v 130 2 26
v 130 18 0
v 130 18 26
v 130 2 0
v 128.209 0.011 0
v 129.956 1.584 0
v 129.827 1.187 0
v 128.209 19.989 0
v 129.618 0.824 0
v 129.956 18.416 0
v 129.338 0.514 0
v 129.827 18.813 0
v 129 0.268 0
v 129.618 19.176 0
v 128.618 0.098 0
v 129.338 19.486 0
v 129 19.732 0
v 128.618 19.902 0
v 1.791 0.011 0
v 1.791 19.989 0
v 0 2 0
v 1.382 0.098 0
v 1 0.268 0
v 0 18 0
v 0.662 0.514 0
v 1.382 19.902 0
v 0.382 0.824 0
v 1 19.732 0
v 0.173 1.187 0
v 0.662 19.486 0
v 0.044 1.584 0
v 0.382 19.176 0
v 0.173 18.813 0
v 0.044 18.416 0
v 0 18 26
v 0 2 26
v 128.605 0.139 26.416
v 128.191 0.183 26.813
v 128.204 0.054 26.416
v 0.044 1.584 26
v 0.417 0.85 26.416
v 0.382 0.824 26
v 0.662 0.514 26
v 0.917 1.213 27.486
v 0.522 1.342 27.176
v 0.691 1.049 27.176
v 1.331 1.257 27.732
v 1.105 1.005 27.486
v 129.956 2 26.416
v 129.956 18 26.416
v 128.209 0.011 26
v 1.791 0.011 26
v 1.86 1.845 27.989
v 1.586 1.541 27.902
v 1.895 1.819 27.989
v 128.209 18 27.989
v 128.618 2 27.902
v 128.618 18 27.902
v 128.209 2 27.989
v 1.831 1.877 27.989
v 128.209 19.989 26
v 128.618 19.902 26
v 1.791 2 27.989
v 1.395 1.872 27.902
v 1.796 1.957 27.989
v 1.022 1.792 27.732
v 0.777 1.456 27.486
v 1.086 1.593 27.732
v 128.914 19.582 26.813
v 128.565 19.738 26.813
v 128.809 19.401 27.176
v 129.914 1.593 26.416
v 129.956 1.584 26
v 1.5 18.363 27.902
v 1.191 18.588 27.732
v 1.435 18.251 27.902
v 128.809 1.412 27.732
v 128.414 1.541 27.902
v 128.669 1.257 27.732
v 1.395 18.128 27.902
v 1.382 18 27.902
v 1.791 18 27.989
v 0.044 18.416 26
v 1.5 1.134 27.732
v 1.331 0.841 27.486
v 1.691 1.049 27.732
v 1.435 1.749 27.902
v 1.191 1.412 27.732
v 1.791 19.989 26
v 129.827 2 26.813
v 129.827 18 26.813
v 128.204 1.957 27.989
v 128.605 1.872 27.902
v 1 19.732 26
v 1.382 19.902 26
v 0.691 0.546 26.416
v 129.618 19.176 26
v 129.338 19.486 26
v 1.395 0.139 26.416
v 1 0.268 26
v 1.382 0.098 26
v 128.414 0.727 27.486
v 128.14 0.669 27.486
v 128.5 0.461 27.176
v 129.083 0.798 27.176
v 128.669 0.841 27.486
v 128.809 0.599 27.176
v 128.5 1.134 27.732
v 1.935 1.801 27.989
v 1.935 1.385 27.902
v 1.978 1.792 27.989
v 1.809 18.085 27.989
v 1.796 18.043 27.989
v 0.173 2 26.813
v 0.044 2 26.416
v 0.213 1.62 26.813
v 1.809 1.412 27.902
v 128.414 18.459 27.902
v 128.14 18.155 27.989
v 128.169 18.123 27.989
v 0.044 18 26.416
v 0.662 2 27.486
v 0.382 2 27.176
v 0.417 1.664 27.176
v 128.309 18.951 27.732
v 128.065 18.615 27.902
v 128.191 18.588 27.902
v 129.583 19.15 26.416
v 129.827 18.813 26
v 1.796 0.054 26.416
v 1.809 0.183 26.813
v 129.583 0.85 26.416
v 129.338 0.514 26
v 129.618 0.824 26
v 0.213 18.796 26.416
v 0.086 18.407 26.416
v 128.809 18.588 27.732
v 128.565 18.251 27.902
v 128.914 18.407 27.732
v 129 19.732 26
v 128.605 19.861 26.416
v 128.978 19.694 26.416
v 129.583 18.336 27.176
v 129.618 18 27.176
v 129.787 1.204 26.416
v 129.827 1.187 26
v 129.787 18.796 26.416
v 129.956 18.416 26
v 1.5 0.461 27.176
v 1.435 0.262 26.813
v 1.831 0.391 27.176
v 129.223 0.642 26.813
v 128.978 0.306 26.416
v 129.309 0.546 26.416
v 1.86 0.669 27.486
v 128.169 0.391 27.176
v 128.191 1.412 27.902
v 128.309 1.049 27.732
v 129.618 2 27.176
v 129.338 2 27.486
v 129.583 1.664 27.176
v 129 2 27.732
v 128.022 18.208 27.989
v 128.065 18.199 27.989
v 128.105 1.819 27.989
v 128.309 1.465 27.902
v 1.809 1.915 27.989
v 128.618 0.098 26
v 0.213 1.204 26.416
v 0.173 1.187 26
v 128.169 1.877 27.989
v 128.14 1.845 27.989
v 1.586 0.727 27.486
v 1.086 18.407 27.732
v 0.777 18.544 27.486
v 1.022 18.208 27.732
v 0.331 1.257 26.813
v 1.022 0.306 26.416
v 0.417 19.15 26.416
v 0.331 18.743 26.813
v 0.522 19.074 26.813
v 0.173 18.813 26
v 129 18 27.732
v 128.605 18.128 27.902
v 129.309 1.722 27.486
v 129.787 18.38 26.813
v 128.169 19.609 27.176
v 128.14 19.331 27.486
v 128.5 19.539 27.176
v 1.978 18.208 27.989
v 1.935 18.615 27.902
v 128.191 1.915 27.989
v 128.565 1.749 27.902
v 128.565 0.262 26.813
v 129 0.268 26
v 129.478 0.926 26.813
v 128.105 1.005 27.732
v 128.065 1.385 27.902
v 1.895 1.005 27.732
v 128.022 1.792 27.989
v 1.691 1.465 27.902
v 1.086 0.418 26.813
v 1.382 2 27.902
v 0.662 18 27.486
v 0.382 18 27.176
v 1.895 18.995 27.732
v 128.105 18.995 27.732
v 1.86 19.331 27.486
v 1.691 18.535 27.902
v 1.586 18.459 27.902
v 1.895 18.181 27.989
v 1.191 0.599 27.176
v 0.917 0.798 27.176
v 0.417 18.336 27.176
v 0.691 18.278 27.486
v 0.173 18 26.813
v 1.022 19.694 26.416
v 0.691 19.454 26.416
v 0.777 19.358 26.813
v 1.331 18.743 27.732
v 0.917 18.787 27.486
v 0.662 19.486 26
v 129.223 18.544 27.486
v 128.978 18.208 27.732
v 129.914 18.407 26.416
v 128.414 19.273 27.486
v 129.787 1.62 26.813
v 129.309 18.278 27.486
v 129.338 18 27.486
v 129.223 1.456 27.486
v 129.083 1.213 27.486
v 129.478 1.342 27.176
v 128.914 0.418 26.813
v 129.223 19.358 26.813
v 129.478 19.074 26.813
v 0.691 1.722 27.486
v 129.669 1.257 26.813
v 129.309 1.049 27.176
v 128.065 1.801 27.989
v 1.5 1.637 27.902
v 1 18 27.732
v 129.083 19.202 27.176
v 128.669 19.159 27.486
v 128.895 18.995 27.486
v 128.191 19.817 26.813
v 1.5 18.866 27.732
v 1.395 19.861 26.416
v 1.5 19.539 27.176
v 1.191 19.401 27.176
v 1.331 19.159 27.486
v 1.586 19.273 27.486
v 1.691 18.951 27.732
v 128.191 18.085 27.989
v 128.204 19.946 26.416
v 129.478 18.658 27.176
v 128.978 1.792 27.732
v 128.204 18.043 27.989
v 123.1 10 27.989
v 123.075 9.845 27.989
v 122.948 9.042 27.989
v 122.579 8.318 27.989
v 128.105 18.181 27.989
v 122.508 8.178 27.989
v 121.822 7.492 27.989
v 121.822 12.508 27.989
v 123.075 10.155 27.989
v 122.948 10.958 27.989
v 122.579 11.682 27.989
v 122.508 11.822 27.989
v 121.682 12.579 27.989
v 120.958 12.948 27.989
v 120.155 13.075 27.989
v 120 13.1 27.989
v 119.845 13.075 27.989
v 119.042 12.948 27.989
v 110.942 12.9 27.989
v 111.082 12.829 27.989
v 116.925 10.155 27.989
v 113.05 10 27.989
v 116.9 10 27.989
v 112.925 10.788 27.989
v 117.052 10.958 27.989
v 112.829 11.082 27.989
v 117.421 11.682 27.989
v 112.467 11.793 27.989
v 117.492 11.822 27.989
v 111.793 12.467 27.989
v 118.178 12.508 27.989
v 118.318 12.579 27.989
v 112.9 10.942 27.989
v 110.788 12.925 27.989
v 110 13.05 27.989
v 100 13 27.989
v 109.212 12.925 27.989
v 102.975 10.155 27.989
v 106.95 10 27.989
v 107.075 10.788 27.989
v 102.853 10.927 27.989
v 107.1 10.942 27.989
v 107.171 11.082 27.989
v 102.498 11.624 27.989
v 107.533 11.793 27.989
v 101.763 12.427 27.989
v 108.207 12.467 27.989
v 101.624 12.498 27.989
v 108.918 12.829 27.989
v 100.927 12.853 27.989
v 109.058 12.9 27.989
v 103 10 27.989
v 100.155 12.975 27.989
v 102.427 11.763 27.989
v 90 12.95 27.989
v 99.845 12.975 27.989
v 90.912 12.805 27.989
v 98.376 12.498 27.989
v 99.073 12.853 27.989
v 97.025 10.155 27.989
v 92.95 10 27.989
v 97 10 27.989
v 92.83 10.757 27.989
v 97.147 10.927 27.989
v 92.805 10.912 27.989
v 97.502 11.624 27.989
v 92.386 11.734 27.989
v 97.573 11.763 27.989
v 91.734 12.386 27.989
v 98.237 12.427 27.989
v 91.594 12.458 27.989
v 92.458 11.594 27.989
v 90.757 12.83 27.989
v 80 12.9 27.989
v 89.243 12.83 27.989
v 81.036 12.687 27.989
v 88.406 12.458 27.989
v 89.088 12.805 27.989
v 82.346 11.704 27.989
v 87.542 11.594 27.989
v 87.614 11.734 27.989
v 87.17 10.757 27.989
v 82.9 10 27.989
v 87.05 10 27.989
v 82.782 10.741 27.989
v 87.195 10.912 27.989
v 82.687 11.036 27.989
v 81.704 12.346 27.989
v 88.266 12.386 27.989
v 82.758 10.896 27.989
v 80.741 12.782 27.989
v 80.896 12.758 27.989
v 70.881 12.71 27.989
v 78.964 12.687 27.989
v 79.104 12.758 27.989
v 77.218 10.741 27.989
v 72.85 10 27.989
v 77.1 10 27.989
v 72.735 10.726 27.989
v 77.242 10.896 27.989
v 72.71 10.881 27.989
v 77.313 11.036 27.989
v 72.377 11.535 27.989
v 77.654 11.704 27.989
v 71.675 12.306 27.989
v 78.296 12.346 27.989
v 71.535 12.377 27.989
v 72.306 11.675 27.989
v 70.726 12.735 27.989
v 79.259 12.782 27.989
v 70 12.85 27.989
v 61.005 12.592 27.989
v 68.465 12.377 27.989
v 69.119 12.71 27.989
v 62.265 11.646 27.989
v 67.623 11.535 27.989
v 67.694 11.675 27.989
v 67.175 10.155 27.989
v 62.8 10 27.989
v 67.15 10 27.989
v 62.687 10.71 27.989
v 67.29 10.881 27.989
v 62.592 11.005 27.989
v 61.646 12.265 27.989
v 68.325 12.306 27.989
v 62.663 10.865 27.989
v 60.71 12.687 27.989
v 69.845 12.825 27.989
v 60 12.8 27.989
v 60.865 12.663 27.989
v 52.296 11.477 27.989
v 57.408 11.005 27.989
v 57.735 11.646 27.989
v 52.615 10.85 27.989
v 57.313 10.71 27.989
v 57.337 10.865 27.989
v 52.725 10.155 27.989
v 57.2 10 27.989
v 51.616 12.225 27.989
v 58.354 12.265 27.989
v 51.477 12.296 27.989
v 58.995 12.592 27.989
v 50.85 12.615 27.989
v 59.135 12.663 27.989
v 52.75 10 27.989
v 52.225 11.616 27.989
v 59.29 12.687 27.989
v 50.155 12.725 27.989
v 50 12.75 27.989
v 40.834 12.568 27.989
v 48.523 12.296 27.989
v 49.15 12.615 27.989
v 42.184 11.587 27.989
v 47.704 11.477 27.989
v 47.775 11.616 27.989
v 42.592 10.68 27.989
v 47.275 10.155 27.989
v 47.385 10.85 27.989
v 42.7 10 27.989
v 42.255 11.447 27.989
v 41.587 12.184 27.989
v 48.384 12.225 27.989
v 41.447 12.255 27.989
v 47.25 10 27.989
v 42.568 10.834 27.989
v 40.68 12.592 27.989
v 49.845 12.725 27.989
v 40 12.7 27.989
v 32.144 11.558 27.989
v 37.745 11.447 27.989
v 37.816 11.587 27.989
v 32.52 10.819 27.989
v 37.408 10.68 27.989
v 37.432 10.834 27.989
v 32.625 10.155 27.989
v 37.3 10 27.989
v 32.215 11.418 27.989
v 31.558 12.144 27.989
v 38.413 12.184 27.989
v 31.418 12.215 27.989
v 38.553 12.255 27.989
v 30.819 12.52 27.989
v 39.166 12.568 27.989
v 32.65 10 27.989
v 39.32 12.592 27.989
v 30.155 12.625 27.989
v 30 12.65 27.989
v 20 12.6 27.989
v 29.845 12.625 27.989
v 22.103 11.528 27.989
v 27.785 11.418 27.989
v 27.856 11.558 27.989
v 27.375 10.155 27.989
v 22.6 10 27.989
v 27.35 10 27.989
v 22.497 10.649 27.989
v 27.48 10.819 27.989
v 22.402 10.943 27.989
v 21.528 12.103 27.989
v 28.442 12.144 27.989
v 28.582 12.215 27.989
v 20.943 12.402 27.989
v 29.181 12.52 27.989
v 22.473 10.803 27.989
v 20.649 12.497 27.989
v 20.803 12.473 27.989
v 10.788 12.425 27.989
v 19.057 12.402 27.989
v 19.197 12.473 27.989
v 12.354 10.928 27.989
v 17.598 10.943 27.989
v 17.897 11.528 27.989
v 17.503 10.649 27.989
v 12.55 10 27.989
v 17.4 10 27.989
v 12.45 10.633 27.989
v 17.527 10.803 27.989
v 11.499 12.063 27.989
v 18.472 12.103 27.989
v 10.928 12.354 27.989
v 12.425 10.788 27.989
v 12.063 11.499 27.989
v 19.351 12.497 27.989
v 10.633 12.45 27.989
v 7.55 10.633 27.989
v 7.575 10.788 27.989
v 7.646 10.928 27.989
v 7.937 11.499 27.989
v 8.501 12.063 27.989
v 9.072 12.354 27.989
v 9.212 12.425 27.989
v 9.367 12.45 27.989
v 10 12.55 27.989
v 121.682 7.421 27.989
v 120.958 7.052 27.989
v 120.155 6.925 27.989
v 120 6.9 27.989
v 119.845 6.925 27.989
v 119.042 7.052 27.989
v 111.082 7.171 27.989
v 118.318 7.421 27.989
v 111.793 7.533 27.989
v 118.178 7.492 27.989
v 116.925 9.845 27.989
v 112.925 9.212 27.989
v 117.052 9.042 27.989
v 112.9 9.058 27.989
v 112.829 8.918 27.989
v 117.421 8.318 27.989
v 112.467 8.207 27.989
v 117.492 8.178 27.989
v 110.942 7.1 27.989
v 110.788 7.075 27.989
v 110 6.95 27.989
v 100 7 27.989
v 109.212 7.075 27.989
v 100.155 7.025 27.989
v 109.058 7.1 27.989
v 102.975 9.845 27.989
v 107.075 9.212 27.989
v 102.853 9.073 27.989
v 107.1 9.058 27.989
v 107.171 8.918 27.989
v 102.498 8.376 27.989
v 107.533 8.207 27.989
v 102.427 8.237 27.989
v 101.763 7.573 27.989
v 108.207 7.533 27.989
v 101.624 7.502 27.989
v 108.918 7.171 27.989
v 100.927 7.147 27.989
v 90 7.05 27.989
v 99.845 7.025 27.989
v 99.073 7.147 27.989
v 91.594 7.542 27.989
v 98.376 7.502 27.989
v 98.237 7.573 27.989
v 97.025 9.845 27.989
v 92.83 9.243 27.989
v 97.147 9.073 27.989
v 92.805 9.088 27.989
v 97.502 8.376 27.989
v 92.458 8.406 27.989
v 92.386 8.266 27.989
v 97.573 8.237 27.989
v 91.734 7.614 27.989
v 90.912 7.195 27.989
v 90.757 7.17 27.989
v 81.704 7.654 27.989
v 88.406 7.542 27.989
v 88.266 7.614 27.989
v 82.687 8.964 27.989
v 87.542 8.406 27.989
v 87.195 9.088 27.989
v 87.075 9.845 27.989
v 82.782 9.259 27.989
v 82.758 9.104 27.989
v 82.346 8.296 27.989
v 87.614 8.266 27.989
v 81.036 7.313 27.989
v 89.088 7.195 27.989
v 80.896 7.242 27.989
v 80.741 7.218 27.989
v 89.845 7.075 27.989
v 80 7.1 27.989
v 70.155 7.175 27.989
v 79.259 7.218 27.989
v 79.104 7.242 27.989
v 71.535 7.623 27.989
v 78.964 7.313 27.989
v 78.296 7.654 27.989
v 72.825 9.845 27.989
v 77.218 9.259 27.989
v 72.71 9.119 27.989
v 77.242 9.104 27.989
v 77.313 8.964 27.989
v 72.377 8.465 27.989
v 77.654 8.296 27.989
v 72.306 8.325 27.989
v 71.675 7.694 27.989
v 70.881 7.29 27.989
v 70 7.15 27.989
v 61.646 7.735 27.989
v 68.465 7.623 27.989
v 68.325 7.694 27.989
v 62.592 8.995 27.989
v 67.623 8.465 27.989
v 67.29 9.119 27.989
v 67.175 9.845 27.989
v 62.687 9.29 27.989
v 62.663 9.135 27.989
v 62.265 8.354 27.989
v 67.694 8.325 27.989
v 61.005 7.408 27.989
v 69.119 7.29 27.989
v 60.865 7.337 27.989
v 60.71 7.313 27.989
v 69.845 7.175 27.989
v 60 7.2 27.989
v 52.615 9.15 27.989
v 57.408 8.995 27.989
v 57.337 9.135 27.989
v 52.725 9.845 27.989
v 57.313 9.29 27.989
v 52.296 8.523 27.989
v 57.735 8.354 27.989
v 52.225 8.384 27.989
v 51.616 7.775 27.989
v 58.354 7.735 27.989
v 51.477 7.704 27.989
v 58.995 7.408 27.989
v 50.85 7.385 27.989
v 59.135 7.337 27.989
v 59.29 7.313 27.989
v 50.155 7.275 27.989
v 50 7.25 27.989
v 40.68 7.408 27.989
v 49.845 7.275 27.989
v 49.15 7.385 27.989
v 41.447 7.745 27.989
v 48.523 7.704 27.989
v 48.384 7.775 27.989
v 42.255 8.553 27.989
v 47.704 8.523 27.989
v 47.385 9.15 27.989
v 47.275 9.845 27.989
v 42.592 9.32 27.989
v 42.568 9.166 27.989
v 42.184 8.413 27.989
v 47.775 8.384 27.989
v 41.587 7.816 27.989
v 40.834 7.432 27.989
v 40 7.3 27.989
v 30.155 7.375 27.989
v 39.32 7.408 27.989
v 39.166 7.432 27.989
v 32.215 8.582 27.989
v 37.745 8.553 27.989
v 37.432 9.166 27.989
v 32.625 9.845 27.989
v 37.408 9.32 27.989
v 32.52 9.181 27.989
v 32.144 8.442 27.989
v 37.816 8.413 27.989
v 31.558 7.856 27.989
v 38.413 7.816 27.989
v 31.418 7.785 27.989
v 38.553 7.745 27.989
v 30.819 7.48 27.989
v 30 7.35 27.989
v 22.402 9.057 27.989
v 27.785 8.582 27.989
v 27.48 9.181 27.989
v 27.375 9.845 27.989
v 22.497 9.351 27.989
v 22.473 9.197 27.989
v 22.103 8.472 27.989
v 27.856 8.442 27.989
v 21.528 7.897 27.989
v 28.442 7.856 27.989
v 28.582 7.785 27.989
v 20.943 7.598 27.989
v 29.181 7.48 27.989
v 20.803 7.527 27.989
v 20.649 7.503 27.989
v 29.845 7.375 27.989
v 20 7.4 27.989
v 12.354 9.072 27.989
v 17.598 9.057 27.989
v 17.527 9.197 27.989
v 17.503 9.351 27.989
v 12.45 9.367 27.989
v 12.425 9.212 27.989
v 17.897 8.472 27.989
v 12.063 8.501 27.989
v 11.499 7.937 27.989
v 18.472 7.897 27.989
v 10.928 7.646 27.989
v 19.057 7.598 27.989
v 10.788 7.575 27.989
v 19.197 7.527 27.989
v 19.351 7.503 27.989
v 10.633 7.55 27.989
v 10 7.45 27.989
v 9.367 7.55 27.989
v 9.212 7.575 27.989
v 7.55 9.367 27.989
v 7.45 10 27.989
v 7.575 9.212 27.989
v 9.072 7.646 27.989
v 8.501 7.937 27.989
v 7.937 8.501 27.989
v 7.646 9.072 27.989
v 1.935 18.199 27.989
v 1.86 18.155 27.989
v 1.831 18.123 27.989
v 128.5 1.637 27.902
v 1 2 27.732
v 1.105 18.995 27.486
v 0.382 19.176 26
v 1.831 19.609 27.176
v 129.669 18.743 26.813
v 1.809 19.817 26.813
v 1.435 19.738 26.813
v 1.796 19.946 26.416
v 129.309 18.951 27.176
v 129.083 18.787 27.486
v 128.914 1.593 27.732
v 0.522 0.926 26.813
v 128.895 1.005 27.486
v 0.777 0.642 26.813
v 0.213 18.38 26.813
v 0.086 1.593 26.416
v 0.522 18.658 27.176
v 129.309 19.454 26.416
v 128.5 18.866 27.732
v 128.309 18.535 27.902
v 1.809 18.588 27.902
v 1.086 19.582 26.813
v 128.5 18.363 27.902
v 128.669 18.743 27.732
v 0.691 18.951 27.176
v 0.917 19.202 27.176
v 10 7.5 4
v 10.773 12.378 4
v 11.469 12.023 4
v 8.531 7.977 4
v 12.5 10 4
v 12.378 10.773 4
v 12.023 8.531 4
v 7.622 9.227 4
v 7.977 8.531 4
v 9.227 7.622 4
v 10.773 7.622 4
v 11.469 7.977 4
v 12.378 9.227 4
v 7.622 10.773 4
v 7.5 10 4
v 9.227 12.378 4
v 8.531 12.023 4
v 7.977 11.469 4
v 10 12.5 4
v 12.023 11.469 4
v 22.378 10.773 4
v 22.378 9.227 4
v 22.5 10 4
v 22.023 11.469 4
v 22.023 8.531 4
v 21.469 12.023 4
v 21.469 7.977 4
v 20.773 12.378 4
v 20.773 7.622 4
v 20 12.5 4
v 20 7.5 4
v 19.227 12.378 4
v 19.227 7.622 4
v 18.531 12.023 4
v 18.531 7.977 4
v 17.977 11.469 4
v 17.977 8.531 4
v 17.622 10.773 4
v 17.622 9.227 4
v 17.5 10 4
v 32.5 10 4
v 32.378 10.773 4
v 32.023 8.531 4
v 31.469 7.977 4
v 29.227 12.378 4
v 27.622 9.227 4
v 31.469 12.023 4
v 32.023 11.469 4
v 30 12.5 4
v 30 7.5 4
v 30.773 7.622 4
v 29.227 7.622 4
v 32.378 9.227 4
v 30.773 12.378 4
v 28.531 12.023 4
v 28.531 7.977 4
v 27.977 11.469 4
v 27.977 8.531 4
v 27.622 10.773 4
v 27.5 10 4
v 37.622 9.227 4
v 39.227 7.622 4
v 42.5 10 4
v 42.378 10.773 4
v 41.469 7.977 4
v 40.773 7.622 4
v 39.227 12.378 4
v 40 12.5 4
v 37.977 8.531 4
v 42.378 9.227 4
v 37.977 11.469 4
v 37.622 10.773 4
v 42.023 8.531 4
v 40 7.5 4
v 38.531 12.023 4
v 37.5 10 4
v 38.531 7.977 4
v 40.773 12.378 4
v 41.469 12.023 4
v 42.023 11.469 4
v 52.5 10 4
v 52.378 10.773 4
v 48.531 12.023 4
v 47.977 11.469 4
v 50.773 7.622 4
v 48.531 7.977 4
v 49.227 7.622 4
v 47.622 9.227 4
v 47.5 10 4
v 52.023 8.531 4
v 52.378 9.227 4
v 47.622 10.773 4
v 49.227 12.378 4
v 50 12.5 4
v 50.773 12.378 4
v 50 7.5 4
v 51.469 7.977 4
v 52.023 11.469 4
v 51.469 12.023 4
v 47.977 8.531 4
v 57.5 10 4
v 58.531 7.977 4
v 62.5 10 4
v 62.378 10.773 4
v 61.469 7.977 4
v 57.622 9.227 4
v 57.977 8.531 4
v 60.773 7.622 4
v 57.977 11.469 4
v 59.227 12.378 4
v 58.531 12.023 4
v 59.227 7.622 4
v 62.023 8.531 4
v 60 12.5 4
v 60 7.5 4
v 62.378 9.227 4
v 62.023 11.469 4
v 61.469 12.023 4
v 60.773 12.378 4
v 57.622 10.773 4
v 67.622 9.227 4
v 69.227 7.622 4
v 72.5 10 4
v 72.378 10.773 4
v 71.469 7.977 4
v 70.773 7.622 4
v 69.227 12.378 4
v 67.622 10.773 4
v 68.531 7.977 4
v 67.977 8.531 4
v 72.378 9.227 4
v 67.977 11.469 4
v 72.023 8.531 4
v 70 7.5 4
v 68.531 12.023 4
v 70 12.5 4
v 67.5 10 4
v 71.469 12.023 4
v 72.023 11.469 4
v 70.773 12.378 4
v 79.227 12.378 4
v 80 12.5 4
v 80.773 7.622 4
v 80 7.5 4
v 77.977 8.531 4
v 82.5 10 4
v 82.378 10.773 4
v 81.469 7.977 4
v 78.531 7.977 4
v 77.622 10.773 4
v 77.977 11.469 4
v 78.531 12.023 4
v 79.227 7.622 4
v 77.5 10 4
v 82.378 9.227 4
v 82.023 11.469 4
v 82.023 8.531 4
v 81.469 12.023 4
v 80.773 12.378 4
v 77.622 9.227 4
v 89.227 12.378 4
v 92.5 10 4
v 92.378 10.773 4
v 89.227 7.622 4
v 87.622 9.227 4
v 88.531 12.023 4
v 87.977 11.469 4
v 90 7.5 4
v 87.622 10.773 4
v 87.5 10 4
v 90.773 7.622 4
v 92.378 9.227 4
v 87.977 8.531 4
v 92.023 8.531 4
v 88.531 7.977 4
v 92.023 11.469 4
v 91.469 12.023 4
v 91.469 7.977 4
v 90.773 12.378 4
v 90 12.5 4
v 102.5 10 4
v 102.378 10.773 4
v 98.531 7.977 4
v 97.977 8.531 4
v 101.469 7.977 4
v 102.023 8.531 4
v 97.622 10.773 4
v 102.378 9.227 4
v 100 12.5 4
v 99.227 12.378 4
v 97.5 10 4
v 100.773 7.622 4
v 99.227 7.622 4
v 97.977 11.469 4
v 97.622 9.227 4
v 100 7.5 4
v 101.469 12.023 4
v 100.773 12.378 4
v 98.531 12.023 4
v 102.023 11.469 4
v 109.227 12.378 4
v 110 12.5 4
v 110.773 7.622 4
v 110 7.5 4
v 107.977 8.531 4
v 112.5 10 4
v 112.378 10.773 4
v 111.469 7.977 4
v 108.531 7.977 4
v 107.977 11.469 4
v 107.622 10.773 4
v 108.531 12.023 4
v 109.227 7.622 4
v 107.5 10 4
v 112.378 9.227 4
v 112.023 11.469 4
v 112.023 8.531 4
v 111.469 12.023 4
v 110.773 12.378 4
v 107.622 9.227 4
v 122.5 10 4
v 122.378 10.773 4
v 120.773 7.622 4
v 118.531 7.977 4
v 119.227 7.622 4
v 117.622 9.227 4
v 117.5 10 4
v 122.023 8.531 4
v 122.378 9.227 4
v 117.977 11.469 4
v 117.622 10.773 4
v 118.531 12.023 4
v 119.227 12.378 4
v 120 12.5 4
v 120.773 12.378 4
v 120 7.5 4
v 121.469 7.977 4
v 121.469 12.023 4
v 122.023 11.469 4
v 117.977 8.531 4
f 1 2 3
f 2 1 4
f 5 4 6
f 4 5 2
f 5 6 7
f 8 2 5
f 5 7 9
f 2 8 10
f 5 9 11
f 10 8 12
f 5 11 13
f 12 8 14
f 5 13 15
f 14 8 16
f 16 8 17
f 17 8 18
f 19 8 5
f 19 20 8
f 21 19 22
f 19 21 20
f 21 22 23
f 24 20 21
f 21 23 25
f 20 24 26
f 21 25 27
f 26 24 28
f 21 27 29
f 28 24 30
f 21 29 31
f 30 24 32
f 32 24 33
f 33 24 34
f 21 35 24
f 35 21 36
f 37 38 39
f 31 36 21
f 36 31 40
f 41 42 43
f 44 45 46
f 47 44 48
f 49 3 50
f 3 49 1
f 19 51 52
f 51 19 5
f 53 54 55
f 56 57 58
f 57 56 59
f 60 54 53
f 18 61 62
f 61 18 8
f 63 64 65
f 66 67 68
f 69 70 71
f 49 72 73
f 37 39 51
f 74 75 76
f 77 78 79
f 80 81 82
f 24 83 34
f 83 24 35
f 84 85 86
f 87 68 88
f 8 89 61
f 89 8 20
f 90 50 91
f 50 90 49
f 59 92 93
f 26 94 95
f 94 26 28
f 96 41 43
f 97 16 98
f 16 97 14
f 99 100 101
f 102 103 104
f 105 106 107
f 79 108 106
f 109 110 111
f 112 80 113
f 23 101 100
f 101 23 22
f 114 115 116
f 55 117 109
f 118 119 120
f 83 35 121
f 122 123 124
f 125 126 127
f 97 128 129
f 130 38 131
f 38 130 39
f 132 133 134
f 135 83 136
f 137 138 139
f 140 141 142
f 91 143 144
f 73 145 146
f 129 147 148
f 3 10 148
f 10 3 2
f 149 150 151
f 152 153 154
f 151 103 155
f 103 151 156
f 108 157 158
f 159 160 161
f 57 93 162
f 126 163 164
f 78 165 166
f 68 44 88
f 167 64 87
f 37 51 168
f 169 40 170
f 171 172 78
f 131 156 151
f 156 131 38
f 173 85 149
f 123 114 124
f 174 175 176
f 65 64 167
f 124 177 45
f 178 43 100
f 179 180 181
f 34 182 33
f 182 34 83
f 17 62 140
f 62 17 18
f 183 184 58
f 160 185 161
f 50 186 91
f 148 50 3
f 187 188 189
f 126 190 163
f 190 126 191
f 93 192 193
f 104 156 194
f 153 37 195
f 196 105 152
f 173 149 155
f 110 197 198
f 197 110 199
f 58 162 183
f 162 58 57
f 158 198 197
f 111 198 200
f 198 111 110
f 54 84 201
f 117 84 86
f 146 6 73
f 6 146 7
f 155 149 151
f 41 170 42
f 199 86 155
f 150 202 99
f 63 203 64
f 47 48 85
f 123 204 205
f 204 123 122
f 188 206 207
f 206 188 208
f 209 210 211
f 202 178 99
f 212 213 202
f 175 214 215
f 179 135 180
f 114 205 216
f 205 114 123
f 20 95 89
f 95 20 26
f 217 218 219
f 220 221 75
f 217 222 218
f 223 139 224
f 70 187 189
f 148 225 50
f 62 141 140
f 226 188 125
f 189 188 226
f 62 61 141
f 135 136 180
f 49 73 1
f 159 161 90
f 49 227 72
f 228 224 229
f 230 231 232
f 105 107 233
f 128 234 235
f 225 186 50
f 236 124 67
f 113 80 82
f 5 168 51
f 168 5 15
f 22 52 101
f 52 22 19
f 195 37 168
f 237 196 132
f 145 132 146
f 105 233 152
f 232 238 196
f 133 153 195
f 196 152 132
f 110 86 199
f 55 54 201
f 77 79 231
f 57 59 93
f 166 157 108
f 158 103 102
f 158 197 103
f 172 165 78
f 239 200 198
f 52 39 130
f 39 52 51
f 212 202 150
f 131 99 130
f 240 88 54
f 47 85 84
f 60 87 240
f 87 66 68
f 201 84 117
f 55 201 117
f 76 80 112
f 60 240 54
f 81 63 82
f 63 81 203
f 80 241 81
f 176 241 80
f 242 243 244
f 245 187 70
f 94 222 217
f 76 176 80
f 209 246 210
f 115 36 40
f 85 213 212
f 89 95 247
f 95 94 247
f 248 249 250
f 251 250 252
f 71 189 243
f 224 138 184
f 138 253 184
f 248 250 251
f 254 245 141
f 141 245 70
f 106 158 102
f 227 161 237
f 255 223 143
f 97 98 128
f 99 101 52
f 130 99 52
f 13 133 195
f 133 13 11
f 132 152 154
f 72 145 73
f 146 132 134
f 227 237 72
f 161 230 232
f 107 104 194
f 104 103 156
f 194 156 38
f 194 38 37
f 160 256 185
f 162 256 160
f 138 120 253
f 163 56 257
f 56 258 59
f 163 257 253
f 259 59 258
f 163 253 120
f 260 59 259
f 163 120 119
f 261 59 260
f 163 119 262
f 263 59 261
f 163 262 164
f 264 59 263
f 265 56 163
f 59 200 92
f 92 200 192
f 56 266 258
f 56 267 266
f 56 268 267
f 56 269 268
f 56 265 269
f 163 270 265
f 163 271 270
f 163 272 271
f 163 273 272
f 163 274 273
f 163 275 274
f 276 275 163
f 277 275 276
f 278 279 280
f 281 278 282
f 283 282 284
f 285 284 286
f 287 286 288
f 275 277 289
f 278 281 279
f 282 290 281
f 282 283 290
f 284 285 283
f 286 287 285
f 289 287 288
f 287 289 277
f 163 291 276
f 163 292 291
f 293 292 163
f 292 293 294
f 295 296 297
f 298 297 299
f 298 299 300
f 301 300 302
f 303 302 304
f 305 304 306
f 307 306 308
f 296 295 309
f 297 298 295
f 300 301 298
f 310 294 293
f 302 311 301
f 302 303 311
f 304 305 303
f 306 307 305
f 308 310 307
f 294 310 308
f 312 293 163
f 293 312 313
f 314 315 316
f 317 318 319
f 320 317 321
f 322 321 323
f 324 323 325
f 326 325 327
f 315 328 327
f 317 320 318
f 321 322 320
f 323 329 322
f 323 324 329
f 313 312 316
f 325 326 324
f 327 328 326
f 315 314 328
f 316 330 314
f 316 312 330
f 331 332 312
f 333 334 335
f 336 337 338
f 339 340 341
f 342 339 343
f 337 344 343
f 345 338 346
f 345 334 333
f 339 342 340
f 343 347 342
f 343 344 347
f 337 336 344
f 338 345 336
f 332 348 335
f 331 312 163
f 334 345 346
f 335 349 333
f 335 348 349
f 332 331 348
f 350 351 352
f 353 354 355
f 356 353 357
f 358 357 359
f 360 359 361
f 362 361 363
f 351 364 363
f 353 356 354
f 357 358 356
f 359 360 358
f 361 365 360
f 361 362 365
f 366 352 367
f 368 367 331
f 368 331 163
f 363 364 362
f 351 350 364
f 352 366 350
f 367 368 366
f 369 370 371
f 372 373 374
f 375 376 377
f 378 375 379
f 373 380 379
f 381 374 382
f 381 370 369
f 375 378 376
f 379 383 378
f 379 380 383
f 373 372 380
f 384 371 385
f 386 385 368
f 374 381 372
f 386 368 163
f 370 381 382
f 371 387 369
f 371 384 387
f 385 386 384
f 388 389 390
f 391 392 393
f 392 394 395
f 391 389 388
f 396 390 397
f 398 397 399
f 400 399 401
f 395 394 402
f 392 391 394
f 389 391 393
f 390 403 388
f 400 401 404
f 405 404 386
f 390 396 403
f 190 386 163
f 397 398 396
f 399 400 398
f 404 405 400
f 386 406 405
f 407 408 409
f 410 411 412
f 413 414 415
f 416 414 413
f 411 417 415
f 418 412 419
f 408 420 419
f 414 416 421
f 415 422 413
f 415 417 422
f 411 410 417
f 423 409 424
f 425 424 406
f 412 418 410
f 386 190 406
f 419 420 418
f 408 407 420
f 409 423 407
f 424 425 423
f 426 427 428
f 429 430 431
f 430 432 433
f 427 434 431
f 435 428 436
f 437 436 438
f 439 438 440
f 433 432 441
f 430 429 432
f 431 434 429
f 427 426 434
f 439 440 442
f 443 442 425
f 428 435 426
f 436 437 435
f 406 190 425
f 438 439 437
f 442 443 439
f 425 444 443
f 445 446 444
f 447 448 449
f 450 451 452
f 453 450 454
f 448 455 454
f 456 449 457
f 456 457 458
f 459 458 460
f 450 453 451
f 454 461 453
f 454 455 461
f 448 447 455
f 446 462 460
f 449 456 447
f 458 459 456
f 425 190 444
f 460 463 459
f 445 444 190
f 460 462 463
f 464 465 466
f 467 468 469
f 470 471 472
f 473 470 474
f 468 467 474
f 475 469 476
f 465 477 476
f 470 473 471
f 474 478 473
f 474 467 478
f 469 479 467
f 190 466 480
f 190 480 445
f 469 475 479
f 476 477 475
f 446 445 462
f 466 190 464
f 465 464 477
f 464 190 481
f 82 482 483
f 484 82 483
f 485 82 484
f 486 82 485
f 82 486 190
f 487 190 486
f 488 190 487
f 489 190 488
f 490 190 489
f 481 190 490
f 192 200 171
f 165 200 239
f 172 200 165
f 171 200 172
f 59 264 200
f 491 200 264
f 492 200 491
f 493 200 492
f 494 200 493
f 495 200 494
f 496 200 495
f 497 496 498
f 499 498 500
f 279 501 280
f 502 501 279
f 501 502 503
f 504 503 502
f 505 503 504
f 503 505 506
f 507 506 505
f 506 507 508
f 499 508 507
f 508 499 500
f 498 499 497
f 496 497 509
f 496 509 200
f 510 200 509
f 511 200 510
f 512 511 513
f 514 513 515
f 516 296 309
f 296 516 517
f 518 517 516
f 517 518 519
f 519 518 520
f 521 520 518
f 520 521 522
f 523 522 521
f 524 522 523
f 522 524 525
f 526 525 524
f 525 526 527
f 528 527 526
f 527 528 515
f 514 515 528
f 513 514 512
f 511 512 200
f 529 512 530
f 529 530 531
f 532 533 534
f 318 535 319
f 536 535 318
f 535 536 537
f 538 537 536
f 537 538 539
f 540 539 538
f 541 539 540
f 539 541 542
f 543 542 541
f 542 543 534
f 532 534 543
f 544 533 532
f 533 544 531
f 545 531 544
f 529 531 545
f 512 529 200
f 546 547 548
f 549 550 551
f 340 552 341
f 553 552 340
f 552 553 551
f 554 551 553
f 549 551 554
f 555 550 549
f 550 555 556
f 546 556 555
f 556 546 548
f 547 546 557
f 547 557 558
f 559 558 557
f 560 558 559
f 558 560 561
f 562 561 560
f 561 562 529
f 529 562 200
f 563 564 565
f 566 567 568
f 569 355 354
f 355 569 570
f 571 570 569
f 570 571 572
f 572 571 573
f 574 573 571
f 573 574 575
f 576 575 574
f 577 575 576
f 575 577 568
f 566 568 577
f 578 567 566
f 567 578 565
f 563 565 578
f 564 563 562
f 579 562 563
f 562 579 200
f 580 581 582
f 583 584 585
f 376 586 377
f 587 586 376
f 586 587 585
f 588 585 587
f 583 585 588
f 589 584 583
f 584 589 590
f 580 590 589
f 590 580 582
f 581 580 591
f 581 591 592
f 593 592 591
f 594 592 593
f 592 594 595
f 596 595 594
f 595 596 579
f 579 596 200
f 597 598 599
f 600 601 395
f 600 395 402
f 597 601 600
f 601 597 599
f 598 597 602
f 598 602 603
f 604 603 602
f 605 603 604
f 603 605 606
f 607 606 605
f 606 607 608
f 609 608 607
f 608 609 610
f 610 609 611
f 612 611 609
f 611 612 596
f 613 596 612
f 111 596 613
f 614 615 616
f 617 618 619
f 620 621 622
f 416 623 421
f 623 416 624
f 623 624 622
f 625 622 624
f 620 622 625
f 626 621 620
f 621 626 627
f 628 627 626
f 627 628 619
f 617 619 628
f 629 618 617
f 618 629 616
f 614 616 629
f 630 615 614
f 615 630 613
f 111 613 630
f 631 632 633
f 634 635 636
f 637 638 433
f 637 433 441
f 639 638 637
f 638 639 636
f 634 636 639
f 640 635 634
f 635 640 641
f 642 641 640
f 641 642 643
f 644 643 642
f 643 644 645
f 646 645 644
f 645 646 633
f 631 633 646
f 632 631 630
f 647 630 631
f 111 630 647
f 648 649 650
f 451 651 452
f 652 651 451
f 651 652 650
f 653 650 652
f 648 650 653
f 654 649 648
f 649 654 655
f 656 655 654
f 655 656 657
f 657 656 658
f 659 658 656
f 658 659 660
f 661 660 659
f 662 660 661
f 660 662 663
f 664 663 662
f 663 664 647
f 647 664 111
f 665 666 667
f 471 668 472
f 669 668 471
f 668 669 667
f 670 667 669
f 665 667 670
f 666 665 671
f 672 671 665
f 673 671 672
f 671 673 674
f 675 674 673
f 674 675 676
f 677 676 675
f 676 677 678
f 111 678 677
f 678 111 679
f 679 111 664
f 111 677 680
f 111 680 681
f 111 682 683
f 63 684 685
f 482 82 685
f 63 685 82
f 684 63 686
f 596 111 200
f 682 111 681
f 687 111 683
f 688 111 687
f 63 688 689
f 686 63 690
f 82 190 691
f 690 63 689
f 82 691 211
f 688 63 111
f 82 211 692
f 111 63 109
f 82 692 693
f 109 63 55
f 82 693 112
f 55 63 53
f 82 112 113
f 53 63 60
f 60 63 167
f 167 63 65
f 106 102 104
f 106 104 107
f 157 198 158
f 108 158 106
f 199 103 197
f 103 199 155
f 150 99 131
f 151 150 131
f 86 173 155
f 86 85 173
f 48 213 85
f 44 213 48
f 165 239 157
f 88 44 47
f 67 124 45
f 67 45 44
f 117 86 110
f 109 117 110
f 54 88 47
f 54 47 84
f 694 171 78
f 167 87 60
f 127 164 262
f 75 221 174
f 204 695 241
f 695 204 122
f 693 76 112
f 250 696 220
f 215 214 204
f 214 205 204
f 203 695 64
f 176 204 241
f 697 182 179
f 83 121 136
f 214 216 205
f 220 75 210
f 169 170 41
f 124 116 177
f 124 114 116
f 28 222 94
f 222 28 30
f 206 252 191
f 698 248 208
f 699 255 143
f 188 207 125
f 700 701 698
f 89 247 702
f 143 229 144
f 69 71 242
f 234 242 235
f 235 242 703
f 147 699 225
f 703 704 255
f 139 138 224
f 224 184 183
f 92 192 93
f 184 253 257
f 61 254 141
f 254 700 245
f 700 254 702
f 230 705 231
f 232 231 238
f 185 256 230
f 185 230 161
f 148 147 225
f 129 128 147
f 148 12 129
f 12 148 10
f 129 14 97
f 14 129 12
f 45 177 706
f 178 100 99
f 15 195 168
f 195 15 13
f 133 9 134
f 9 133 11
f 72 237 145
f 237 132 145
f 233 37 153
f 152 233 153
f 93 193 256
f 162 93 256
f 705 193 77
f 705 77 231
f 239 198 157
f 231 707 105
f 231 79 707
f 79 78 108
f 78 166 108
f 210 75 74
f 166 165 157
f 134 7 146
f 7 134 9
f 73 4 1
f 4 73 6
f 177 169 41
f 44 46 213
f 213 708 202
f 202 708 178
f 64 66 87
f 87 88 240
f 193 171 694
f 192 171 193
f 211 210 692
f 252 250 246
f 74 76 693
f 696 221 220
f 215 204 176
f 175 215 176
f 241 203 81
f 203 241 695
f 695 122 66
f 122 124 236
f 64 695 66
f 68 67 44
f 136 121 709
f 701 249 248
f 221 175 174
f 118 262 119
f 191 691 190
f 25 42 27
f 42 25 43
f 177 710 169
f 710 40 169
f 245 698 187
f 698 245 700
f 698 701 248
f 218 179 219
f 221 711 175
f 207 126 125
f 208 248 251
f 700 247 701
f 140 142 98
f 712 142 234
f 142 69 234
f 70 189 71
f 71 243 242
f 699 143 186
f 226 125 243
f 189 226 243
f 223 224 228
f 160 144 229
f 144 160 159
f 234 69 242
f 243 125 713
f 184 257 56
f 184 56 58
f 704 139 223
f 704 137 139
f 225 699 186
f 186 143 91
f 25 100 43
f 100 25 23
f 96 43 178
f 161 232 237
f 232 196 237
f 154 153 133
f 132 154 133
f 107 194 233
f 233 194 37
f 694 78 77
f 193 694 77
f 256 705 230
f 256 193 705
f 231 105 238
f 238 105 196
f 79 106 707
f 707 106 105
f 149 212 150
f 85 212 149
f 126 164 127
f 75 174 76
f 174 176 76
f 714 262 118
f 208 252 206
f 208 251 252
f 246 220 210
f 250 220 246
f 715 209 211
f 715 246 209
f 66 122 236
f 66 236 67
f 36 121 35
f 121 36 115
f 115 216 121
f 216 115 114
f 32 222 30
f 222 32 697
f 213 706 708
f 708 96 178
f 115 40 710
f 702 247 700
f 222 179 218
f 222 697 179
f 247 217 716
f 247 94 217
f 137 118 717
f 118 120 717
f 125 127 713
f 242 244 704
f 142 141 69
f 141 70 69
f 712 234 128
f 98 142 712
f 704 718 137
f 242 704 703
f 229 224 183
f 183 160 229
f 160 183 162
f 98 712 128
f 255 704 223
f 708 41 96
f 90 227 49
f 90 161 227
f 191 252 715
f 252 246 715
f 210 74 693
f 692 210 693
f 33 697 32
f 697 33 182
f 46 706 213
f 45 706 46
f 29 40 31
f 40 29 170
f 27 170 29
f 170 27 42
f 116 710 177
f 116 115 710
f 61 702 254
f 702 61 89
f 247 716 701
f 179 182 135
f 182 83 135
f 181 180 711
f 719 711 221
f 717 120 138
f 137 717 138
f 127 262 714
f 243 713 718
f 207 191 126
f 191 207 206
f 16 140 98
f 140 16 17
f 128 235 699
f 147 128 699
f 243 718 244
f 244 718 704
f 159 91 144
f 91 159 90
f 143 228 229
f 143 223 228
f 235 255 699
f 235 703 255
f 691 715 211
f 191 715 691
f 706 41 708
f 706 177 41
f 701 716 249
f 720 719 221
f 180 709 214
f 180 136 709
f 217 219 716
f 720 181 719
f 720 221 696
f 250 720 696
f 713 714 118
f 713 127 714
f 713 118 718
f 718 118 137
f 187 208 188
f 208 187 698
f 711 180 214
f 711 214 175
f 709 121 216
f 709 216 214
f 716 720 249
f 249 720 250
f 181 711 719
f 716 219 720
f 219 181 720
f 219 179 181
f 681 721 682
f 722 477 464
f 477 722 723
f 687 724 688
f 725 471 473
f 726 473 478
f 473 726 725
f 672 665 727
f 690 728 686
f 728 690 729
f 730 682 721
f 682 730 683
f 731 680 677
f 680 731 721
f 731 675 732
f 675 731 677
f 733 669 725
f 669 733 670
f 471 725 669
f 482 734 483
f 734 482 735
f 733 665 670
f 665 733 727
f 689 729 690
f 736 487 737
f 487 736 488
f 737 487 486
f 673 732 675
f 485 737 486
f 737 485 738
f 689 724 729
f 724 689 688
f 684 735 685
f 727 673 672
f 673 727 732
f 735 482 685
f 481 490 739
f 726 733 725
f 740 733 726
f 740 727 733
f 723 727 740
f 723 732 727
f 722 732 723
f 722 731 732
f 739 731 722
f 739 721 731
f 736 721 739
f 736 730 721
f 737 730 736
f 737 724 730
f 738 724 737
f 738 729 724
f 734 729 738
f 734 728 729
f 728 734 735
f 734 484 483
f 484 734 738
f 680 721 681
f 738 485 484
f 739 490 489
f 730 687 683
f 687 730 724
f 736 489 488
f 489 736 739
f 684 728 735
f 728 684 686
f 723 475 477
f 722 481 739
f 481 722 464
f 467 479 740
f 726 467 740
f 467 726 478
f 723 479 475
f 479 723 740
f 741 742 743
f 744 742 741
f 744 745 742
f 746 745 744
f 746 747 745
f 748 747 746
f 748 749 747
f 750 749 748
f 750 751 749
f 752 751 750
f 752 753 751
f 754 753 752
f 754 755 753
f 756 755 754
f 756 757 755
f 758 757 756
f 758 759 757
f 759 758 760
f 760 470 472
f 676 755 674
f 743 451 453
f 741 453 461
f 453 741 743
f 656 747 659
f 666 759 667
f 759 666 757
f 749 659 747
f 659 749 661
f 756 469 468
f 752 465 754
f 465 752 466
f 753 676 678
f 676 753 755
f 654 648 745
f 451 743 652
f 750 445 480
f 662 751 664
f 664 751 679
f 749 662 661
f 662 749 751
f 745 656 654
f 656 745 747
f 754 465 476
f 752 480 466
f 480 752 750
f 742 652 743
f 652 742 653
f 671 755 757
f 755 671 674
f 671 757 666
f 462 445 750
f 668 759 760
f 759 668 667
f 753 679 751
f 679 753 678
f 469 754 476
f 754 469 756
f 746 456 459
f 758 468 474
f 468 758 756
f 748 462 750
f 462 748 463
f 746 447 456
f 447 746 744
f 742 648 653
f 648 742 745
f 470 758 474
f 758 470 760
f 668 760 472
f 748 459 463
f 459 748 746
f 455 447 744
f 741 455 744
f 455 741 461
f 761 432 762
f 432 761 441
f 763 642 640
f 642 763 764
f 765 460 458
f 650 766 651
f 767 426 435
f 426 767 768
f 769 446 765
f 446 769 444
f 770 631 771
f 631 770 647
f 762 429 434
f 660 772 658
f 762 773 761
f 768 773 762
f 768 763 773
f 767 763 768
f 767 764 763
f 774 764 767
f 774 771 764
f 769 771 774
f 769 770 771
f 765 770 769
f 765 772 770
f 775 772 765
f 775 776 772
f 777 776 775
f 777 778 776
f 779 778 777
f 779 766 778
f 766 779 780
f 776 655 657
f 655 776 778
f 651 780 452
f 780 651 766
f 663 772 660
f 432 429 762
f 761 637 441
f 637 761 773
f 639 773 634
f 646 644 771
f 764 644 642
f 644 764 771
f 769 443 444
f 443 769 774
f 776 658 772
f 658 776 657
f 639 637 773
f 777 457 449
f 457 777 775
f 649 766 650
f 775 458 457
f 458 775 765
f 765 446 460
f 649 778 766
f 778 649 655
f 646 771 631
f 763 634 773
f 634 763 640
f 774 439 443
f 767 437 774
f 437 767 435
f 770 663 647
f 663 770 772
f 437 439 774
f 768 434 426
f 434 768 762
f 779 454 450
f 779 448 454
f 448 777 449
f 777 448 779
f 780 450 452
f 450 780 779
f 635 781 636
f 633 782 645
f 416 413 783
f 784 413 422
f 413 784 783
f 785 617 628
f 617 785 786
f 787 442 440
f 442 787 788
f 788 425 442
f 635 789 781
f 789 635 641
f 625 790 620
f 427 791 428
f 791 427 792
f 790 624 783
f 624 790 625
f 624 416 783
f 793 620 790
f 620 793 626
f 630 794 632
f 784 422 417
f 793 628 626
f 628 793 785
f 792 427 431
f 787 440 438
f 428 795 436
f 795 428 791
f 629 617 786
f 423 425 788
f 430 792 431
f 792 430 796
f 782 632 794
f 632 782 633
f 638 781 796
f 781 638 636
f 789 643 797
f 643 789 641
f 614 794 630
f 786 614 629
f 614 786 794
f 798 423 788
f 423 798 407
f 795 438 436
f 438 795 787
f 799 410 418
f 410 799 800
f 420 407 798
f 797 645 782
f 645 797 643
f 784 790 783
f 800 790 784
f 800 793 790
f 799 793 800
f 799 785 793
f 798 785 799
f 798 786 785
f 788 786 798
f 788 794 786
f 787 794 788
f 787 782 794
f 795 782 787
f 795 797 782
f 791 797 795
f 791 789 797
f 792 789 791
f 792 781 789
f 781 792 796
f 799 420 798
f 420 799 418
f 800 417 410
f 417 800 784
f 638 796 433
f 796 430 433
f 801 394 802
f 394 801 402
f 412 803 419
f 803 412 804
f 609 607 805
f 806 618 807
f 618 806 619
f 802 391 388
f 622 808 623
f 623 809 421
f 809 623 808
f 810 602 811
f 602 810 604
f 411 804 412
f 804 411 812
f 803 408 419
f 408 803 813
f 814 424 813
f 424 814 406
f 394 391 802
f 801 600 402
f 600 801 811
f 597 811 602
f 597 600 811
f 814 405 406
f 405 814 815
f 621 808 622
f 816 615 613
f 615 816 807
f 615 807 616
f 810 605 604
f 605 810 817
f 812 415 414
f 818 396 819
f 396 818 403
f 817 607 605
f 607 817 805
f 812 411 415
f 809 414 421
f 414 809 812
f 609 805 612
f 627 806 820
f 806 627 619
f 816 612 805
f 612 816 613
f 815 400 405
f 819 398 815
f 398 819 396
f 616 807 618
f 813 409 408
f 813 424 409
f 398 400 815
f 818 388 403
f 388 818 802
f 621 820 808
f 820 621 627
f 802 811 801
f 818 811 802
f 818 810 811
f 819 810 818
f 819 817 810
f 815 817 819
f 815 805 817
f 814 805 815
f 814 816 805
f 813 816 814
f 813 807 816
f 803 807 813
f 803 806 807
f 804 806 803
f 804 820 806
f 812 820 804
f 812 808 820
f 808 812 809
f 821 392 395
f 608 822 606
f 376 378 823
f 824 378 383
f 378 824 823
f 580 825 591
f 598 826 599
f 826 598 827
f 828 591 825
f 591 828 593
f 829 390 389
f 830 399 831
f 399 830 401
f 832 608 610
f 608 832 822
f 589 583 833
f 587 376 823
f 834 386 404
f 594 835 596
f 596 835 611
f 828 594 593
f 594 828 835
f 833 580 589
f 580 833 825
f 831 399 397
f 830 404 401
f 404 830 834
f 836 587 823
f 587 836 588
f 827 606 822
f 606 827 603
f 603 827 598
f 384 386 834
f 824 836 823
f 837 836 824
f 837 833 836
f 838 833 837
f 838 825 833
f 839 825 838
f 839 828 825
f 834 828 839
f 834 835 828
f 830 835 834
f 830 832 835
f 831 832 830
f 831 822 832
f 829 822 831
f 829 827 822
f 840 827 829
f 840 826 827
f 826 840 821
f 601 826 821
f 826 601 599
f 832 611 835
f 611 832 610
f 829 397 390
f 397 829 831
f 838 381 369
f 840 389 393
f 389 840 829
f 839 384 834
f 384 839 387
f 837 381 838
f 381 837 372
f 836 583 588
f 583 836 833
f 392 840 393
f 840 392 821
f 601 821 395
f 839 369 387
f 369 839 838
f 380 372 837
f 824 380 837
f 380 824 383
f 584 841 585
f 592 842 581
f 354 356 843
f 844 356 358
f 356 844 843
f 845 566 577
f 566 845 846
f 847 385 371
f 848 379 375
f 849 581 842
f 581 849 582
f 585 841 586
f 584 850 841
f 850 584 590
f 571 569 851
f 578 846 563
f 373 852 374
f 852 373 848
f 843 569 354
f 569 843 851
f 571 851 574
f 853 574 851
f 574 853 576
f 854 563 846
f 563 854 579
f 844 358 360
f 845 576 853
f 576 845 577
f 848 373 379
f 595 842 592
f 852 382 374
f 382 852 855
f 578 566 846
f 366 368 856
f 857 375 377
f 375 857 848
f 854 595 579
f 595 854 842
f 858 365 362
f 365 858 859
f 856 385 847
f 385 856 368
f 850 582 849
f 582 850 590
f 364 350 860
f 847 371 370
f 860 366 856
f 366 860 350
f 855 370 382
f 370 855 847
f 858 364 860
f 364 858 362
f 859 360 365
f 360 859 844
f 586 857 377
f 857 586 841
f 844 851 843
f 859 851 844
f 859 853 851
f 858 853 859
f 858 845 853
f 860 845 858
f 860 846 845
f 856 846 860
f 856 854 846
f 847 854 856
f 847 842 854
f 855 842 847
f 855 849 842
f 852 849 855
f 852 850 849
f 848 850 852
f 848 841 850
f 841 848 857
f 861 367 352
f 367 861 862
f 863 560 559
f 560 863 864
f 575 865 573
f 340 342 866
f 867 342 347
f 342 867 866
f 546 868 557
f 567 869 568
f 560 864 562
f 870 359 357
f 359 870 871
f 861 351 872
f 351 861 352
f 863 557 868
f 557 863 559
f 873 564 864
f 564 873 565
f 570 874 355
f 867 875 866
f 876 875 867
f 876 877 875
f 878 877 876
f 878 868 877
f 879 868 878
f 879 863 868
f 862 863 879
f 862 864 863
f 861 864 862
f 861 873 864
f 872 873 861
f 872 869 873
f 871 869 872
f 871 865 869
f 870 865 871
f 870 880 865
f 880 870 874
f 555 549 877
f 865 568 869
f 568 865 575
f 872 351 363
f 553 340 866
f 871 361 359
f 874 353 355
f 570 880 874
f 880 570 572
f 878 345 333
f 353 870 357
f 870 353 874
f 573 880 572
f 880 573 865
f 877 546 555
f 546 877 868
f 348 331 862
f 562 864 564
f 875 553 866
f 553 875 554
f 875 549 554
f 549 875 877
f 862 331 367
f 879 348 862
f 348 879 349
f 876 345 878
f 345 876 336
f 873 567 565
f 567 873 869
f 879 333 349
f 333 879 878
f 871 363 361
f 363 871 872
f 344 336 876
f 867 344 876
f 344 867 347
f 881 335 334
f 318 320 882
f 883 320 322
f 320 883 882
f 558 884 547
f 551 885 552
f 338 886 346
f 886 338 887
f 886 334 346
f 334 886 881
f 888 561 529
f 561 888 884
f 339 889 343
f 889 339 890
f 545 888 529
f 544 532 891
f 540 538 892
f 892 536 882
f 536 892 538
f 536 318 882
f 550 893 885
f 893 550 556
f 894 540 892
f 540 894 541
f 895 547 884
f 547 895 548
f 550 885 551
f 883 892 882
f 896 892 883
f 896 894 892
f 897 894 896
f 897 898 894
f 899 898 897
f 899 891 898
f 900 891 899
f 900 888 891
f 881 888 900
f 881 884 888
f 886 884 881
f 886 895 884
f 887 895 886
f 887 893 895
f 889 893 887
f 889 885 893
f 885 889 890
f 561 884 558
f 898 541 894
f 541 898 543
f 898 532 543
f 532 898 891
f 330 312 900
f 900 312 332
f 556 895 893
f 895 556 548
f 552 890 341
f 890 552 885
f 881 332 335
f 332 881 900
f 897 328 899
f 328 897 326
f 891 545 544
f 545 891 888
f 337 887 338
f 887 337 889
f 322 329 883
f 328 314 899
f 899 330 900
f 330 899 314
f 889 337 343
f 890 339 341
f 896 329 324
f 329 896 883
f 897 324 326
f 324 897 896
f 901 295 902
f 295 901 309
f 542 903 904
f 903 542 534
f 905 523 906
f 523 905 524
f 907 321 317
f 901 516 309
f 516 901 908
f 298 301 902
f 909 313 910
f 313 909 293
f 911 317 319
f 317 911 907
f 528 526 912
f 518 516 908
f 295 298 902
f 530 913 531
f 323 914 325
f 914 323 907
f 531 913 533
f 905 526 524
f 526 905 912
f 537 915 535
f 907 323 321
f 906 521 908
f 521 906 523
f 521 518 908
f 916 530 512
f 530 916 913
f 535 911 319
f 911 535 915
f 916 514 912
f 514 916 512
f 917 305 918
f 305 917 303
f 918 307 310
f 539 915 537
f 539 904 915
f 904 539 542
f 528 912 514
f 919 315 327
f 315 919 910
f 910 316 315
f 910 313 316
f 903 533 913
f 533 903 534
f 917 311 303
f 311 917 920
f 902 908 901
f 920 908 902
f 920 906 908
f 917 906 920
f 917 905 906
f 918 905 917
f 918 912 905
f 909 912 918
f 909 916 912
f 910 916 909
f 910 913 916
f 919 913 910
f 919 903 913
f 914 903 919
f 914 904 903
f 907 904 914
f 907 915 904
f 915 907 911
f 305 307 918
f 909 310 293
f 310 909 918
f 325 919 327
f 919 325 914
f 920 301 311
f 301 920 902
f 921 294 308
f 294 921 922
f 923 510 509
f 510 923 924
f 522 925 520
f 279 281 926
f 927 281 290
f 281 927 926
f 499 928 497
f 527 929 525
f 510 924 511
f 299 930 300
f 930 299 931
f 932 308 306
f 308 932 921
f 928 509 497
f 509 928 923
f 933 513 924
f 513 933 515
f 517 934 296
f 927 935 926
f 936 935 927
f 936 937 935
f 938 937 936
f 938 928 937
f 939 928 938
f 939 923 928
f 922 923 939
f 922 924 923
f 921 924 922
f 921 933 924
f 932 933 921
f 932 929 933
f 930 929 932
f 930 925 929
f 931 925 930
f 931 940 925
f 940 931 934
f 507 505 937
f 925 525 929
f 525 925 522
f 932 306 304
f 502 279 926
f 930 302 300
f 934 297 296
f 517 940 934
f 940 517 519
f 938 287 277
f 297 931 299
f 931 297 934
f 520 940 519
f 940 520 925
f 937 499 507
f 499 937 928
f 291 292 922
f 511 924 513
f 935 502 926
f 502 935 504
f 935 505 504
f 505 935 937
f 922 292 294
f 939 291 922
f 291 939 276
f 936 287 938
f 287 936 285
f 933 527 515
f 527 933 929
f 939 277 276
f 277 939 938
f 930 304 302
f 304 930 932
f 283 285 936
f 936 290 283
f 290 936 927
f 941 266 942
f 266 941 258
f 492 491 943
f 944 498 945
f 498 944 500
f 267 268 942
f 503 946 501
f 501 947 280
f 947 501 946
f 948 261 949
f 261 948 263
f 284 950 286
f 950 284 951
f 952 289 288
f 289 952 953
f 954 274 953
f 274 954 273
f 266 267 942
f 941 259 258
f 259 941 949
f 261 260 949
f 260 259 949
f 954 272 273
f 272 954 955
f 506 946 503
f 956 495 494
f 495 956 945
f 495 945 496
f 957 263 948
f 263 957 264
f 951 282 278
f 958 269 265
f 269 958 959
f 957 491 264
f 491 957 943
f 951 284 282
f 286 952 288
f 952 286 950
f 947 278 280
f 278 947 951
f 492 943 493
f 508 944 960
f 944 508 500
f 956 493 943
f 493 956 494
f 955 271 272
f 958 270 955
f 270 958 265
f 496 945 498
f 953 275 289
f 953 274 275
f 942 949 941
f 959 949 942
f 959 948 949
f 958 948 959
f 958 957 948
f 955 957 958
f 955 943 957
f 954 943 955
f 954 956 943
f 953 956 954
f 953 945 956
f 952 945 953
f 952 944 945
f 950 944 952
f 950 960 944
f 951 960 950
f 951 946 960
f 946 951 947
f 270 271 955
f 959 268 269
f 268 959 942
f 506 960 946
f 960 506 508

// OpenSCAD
holes=12;
difference(){
  box(holes*10+10,20,30,2,bottom=0);
  for(n=[1:holes])
    translate([n*10,10,4]) cylinder(d1=5,d2=n/8+5,h=30,$fn=20);
}
module box(w,d,h,r=1,top=1,bottom=1)
{
  intersection(){
    cube([w,d,h]);
    minkowski(){
      translate([r,r,bottom?r:0]) cube([w-r*2,d-r*2,h-r*2]);
      sphere(r,$fn=30);
    }
  }
}
